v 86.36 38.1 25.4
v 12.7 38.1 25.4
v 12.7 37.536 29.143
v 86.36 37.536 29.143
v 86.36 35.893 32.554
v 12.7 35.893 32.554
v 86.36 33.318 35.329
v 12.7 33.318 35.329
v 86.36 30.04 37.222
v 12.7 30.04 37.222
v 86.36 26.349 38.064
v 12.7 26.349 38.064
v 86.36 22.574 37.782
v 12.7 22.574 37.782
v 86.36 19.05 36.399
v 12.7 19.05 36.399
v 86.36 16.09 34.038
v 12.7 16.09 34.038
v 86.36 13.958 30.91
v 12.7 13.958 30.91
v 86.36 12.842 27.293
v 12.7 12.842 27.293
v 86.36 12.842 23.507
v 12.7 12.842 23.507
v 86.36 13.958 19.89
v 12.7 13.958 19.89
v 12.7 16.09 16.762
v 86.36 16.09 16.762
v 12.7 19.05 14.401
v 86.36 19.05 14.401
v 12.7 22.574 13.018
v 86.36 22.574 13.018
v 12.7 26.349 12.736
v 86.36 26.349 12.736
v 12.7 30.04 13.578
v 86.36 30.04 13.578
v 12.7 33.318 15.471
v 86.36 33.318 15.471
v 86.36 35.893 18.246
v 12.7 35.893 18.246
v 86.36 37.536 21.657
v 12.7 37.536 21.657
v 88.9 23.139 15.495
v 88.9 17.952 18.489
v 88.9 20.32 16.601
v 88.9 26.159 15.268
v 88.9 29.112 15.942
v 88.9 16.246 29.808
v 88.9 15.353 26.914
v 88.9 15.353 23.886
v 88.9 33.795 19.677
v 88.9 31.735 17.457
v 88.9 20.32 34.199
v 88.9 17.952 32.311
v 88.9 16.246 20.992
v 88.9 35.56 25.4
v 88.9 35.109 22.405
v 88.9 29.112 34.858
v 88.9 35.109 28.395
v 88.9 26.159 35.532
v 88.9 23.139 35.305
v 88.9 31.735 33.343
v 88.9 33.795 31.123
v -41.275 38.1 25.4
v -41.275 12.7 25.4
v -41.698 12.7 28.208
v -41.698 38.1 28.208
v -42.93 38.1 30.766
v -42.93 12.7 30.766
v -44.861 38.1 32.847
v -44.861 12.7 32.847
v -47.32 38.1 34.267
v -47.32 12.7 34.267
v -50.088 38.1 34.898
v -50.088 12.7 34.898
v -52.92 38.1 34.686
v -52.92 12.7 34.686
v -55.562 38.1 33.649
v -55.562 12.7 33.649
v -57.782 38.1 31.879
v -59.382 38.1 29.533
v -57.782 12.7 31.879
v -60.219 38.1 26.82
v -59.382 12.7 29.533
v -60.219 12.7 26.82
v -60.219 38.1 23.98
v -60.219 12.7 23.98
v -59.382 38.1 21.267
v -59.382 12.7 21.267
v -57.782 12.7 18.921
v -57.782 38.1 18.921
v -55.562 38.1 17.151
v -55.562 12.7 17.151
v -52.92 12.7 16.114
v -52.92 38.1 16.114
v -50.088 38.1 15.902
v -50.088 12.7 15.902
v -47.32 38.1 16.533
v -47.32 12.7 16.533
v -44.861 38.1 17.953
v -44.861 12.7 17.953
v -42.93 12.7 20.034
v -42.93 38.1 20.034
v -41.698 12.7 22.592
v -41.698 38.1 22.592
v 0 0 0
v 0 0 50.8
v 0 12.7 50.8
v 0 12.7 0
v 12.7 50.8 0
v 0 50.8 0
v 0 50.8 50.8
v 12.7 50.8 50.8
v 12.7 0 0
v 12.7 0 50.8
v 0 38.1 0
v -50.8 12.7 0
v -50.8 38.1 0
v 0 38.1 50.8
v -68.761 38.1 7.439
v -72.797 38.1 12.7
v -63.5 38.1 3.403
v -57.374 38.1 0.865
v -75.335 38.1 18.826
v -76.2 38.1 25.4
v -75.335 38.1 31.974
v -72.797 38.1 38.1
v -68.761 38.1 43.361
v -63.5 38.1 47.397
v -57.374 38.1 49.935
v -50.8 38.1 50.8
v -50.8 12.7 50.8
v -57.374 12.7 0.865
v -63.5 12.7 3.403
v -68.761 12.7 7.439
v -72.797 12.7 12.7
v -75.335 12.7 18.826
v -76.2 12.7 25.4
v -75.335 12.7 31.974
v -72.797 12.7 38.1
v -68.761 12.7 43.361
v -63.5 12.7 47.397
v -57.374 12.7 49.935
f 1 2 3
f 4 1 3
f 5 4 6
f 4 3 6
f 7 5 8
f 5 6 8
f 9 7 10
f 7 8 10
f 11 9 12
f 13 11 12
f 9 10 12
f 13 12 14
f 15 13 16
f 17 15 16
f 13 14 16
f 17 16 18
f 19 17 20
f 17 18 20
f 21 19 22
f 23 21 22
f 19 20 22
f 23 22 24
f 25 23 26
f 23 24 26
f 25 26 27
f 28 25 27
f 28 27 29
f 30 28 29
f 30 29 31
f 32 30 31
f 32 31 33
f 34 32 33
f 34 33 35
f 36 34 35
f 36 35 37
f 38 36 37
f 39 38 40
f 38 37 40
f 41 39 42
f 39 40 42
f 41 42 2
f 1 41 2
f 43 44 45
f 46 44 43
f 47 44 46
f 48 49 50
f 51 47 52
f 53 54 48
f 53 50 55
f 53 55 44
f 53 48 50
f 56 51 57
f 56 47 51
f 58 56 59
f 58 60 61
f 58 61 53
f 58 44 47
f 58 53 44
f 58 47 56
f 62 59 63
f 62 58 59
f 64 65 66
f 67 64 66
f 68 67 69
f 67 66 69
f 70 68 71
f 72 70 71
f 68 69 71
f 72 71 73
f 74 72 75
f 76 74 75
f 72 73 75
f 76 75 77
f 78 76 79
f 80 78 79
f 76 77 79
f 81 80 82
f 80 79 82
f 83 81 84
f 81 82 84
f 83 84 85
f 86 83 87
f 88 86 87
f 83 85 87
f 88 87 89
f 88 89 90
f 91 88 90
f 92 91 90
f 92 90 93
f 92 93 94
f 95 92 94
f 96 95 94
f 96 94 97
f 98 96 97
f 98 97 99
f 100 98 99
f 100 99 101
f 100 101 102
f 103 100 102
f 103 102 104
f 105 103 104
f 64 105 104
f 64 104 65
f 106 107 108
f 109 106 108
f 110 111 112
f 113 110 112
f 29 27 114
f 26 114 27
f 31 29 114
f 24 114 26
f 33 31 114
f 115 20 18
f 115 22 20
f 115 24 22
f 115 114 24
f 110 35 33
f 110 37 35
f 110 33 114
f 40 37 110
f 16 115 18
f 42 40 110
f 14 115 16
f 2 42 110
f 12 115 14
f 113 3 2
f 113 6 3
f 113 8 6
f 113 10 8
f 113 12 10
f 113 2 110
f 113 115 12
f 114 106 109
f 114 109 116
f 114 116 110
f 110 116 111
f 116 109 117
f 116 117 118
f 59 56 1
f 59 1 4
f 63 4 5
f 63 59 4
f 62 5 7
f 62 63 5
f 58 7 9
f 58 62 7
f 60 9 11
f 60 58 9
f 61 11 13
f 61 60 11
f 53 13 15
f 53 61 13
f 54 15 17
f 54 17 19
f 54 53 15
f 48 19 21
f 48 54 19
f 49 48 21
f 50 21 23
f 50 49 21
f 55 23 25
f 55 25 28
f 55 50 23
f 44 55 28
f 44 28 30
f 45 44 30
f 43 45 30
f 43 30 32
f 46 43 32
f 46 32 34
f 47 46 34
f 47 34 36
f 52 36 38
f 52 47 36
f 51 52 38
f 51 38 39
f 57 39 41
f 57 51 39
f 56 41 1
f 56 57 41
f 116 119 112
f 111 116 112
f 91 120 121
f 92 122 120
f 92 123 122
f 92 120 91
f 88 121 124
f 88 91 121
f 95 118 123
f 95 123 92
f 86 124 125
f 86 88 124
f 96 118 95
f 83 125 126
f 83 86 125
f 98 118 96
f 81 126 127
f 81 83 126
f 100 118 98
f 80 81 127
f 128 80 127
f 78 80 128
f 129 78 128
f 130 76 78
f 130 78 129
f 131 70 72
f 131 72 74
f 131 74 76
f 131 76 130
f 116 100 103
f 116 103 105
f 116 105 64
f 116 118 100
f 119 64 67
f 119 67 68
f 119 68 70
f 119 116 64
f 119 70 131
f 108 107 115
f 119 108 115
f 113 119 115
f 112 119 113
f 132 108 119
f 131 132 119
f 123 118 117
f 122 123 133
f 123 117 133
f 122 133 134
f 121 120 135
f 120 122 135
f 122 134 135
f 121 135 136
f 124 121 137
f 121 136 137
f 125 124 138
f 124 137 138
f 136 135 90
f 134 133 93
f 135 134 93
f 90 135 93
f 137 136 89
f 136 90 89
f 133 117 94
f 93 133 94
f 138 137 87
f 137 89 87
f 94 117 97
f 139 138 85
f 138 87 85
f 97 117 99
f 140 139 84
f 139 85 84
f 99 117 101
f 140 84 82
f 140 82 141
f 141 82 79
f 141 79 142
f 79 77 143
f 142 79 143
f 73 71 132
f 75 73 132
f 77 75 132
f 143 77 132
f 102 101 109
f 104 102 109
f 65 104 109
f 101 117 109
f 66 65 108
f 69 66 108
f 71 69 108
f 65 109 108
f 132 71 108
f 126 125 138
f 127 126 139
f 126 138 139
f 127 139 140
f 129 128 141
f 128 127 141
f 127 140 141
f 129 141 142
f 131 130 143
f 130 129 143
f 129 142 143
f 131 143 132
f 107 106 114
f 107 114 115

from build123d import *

# Parameters (mm, degrees)
F0_W     = 50.8
F0_H     = 50.8
F1_DEPTH = 12.7
F2_R     = 12.7
F3_DEPTH = 76.2
F4_SIZE  = 2.54
F5_W     = 25.4
F5_H     = 50.8
F6_DEPTH = 76.2
F7_R     = 9.525
F8_DEPTH = 38.101


with BuildPart() as f1:
    # F0 (on Right) → F1 (new body)
    with BuildSketch(Plane.YZ):
        with Locations((25.4, 25.4)):
            Rectangle(F0_W, F0_H)
    extrude(amount=F1_DEPTH)

    # F2 (on face) → F3 (join)
    with BuildSketch(Plane.YZ.offset(12.7)):
        with Locations((25.4, 25.4)):
            Circle(F2_R)
    extrude(amount=F3_DEPTH)

    # F4
    f4_edges = [f1.edges().sort_by_distance(p)[0] for p in [
        (88.9, 12.7, 25.4),
    ]]
    chamfer(f4_edges, length=F4_SIZE)

    # F5 (on face) → F6 (join)
    with BuildSketch(Plane(origin=(0, 0, 0), x_dir=(0, -1, 0), z_dir=(-1, 0, 0))):
        with Locations((-25.4, 25.4)):
            Rectangle(F5_W, F5_H)
    extrude(amount=F6_DEPTH)

    # F7 (on face) → F8 (cut, through all)
    with BuildSketch(Plane.XZ.offset(-12.7)):
        with BuildLine():
            ThreePointArc((-76.2, 25.4), (-68.760512, 43.360512), (-50.8, 50.8))
            Line((-50.8, 50.8), (-76.2, 50.8))
            Line((-76.2, 50.8), (-76.2, 25.4))
        make_face()
        with BuildLine():
            ThreePointArc((-50.8, 0), (-68.760512, 7.439488), (-76.2, 25.4))
            Line((-76.2, 25.4), (-76.2, 0))
            Line((-76.2, 0), (-50.8, 0))
        make_face()
        with Locations((-50.8, 25.4)):
            Circle(F7_R)
    extrude(amount=-F8_DEPTH, mode=Mode.SUBTRACT)


solid = f1.part
